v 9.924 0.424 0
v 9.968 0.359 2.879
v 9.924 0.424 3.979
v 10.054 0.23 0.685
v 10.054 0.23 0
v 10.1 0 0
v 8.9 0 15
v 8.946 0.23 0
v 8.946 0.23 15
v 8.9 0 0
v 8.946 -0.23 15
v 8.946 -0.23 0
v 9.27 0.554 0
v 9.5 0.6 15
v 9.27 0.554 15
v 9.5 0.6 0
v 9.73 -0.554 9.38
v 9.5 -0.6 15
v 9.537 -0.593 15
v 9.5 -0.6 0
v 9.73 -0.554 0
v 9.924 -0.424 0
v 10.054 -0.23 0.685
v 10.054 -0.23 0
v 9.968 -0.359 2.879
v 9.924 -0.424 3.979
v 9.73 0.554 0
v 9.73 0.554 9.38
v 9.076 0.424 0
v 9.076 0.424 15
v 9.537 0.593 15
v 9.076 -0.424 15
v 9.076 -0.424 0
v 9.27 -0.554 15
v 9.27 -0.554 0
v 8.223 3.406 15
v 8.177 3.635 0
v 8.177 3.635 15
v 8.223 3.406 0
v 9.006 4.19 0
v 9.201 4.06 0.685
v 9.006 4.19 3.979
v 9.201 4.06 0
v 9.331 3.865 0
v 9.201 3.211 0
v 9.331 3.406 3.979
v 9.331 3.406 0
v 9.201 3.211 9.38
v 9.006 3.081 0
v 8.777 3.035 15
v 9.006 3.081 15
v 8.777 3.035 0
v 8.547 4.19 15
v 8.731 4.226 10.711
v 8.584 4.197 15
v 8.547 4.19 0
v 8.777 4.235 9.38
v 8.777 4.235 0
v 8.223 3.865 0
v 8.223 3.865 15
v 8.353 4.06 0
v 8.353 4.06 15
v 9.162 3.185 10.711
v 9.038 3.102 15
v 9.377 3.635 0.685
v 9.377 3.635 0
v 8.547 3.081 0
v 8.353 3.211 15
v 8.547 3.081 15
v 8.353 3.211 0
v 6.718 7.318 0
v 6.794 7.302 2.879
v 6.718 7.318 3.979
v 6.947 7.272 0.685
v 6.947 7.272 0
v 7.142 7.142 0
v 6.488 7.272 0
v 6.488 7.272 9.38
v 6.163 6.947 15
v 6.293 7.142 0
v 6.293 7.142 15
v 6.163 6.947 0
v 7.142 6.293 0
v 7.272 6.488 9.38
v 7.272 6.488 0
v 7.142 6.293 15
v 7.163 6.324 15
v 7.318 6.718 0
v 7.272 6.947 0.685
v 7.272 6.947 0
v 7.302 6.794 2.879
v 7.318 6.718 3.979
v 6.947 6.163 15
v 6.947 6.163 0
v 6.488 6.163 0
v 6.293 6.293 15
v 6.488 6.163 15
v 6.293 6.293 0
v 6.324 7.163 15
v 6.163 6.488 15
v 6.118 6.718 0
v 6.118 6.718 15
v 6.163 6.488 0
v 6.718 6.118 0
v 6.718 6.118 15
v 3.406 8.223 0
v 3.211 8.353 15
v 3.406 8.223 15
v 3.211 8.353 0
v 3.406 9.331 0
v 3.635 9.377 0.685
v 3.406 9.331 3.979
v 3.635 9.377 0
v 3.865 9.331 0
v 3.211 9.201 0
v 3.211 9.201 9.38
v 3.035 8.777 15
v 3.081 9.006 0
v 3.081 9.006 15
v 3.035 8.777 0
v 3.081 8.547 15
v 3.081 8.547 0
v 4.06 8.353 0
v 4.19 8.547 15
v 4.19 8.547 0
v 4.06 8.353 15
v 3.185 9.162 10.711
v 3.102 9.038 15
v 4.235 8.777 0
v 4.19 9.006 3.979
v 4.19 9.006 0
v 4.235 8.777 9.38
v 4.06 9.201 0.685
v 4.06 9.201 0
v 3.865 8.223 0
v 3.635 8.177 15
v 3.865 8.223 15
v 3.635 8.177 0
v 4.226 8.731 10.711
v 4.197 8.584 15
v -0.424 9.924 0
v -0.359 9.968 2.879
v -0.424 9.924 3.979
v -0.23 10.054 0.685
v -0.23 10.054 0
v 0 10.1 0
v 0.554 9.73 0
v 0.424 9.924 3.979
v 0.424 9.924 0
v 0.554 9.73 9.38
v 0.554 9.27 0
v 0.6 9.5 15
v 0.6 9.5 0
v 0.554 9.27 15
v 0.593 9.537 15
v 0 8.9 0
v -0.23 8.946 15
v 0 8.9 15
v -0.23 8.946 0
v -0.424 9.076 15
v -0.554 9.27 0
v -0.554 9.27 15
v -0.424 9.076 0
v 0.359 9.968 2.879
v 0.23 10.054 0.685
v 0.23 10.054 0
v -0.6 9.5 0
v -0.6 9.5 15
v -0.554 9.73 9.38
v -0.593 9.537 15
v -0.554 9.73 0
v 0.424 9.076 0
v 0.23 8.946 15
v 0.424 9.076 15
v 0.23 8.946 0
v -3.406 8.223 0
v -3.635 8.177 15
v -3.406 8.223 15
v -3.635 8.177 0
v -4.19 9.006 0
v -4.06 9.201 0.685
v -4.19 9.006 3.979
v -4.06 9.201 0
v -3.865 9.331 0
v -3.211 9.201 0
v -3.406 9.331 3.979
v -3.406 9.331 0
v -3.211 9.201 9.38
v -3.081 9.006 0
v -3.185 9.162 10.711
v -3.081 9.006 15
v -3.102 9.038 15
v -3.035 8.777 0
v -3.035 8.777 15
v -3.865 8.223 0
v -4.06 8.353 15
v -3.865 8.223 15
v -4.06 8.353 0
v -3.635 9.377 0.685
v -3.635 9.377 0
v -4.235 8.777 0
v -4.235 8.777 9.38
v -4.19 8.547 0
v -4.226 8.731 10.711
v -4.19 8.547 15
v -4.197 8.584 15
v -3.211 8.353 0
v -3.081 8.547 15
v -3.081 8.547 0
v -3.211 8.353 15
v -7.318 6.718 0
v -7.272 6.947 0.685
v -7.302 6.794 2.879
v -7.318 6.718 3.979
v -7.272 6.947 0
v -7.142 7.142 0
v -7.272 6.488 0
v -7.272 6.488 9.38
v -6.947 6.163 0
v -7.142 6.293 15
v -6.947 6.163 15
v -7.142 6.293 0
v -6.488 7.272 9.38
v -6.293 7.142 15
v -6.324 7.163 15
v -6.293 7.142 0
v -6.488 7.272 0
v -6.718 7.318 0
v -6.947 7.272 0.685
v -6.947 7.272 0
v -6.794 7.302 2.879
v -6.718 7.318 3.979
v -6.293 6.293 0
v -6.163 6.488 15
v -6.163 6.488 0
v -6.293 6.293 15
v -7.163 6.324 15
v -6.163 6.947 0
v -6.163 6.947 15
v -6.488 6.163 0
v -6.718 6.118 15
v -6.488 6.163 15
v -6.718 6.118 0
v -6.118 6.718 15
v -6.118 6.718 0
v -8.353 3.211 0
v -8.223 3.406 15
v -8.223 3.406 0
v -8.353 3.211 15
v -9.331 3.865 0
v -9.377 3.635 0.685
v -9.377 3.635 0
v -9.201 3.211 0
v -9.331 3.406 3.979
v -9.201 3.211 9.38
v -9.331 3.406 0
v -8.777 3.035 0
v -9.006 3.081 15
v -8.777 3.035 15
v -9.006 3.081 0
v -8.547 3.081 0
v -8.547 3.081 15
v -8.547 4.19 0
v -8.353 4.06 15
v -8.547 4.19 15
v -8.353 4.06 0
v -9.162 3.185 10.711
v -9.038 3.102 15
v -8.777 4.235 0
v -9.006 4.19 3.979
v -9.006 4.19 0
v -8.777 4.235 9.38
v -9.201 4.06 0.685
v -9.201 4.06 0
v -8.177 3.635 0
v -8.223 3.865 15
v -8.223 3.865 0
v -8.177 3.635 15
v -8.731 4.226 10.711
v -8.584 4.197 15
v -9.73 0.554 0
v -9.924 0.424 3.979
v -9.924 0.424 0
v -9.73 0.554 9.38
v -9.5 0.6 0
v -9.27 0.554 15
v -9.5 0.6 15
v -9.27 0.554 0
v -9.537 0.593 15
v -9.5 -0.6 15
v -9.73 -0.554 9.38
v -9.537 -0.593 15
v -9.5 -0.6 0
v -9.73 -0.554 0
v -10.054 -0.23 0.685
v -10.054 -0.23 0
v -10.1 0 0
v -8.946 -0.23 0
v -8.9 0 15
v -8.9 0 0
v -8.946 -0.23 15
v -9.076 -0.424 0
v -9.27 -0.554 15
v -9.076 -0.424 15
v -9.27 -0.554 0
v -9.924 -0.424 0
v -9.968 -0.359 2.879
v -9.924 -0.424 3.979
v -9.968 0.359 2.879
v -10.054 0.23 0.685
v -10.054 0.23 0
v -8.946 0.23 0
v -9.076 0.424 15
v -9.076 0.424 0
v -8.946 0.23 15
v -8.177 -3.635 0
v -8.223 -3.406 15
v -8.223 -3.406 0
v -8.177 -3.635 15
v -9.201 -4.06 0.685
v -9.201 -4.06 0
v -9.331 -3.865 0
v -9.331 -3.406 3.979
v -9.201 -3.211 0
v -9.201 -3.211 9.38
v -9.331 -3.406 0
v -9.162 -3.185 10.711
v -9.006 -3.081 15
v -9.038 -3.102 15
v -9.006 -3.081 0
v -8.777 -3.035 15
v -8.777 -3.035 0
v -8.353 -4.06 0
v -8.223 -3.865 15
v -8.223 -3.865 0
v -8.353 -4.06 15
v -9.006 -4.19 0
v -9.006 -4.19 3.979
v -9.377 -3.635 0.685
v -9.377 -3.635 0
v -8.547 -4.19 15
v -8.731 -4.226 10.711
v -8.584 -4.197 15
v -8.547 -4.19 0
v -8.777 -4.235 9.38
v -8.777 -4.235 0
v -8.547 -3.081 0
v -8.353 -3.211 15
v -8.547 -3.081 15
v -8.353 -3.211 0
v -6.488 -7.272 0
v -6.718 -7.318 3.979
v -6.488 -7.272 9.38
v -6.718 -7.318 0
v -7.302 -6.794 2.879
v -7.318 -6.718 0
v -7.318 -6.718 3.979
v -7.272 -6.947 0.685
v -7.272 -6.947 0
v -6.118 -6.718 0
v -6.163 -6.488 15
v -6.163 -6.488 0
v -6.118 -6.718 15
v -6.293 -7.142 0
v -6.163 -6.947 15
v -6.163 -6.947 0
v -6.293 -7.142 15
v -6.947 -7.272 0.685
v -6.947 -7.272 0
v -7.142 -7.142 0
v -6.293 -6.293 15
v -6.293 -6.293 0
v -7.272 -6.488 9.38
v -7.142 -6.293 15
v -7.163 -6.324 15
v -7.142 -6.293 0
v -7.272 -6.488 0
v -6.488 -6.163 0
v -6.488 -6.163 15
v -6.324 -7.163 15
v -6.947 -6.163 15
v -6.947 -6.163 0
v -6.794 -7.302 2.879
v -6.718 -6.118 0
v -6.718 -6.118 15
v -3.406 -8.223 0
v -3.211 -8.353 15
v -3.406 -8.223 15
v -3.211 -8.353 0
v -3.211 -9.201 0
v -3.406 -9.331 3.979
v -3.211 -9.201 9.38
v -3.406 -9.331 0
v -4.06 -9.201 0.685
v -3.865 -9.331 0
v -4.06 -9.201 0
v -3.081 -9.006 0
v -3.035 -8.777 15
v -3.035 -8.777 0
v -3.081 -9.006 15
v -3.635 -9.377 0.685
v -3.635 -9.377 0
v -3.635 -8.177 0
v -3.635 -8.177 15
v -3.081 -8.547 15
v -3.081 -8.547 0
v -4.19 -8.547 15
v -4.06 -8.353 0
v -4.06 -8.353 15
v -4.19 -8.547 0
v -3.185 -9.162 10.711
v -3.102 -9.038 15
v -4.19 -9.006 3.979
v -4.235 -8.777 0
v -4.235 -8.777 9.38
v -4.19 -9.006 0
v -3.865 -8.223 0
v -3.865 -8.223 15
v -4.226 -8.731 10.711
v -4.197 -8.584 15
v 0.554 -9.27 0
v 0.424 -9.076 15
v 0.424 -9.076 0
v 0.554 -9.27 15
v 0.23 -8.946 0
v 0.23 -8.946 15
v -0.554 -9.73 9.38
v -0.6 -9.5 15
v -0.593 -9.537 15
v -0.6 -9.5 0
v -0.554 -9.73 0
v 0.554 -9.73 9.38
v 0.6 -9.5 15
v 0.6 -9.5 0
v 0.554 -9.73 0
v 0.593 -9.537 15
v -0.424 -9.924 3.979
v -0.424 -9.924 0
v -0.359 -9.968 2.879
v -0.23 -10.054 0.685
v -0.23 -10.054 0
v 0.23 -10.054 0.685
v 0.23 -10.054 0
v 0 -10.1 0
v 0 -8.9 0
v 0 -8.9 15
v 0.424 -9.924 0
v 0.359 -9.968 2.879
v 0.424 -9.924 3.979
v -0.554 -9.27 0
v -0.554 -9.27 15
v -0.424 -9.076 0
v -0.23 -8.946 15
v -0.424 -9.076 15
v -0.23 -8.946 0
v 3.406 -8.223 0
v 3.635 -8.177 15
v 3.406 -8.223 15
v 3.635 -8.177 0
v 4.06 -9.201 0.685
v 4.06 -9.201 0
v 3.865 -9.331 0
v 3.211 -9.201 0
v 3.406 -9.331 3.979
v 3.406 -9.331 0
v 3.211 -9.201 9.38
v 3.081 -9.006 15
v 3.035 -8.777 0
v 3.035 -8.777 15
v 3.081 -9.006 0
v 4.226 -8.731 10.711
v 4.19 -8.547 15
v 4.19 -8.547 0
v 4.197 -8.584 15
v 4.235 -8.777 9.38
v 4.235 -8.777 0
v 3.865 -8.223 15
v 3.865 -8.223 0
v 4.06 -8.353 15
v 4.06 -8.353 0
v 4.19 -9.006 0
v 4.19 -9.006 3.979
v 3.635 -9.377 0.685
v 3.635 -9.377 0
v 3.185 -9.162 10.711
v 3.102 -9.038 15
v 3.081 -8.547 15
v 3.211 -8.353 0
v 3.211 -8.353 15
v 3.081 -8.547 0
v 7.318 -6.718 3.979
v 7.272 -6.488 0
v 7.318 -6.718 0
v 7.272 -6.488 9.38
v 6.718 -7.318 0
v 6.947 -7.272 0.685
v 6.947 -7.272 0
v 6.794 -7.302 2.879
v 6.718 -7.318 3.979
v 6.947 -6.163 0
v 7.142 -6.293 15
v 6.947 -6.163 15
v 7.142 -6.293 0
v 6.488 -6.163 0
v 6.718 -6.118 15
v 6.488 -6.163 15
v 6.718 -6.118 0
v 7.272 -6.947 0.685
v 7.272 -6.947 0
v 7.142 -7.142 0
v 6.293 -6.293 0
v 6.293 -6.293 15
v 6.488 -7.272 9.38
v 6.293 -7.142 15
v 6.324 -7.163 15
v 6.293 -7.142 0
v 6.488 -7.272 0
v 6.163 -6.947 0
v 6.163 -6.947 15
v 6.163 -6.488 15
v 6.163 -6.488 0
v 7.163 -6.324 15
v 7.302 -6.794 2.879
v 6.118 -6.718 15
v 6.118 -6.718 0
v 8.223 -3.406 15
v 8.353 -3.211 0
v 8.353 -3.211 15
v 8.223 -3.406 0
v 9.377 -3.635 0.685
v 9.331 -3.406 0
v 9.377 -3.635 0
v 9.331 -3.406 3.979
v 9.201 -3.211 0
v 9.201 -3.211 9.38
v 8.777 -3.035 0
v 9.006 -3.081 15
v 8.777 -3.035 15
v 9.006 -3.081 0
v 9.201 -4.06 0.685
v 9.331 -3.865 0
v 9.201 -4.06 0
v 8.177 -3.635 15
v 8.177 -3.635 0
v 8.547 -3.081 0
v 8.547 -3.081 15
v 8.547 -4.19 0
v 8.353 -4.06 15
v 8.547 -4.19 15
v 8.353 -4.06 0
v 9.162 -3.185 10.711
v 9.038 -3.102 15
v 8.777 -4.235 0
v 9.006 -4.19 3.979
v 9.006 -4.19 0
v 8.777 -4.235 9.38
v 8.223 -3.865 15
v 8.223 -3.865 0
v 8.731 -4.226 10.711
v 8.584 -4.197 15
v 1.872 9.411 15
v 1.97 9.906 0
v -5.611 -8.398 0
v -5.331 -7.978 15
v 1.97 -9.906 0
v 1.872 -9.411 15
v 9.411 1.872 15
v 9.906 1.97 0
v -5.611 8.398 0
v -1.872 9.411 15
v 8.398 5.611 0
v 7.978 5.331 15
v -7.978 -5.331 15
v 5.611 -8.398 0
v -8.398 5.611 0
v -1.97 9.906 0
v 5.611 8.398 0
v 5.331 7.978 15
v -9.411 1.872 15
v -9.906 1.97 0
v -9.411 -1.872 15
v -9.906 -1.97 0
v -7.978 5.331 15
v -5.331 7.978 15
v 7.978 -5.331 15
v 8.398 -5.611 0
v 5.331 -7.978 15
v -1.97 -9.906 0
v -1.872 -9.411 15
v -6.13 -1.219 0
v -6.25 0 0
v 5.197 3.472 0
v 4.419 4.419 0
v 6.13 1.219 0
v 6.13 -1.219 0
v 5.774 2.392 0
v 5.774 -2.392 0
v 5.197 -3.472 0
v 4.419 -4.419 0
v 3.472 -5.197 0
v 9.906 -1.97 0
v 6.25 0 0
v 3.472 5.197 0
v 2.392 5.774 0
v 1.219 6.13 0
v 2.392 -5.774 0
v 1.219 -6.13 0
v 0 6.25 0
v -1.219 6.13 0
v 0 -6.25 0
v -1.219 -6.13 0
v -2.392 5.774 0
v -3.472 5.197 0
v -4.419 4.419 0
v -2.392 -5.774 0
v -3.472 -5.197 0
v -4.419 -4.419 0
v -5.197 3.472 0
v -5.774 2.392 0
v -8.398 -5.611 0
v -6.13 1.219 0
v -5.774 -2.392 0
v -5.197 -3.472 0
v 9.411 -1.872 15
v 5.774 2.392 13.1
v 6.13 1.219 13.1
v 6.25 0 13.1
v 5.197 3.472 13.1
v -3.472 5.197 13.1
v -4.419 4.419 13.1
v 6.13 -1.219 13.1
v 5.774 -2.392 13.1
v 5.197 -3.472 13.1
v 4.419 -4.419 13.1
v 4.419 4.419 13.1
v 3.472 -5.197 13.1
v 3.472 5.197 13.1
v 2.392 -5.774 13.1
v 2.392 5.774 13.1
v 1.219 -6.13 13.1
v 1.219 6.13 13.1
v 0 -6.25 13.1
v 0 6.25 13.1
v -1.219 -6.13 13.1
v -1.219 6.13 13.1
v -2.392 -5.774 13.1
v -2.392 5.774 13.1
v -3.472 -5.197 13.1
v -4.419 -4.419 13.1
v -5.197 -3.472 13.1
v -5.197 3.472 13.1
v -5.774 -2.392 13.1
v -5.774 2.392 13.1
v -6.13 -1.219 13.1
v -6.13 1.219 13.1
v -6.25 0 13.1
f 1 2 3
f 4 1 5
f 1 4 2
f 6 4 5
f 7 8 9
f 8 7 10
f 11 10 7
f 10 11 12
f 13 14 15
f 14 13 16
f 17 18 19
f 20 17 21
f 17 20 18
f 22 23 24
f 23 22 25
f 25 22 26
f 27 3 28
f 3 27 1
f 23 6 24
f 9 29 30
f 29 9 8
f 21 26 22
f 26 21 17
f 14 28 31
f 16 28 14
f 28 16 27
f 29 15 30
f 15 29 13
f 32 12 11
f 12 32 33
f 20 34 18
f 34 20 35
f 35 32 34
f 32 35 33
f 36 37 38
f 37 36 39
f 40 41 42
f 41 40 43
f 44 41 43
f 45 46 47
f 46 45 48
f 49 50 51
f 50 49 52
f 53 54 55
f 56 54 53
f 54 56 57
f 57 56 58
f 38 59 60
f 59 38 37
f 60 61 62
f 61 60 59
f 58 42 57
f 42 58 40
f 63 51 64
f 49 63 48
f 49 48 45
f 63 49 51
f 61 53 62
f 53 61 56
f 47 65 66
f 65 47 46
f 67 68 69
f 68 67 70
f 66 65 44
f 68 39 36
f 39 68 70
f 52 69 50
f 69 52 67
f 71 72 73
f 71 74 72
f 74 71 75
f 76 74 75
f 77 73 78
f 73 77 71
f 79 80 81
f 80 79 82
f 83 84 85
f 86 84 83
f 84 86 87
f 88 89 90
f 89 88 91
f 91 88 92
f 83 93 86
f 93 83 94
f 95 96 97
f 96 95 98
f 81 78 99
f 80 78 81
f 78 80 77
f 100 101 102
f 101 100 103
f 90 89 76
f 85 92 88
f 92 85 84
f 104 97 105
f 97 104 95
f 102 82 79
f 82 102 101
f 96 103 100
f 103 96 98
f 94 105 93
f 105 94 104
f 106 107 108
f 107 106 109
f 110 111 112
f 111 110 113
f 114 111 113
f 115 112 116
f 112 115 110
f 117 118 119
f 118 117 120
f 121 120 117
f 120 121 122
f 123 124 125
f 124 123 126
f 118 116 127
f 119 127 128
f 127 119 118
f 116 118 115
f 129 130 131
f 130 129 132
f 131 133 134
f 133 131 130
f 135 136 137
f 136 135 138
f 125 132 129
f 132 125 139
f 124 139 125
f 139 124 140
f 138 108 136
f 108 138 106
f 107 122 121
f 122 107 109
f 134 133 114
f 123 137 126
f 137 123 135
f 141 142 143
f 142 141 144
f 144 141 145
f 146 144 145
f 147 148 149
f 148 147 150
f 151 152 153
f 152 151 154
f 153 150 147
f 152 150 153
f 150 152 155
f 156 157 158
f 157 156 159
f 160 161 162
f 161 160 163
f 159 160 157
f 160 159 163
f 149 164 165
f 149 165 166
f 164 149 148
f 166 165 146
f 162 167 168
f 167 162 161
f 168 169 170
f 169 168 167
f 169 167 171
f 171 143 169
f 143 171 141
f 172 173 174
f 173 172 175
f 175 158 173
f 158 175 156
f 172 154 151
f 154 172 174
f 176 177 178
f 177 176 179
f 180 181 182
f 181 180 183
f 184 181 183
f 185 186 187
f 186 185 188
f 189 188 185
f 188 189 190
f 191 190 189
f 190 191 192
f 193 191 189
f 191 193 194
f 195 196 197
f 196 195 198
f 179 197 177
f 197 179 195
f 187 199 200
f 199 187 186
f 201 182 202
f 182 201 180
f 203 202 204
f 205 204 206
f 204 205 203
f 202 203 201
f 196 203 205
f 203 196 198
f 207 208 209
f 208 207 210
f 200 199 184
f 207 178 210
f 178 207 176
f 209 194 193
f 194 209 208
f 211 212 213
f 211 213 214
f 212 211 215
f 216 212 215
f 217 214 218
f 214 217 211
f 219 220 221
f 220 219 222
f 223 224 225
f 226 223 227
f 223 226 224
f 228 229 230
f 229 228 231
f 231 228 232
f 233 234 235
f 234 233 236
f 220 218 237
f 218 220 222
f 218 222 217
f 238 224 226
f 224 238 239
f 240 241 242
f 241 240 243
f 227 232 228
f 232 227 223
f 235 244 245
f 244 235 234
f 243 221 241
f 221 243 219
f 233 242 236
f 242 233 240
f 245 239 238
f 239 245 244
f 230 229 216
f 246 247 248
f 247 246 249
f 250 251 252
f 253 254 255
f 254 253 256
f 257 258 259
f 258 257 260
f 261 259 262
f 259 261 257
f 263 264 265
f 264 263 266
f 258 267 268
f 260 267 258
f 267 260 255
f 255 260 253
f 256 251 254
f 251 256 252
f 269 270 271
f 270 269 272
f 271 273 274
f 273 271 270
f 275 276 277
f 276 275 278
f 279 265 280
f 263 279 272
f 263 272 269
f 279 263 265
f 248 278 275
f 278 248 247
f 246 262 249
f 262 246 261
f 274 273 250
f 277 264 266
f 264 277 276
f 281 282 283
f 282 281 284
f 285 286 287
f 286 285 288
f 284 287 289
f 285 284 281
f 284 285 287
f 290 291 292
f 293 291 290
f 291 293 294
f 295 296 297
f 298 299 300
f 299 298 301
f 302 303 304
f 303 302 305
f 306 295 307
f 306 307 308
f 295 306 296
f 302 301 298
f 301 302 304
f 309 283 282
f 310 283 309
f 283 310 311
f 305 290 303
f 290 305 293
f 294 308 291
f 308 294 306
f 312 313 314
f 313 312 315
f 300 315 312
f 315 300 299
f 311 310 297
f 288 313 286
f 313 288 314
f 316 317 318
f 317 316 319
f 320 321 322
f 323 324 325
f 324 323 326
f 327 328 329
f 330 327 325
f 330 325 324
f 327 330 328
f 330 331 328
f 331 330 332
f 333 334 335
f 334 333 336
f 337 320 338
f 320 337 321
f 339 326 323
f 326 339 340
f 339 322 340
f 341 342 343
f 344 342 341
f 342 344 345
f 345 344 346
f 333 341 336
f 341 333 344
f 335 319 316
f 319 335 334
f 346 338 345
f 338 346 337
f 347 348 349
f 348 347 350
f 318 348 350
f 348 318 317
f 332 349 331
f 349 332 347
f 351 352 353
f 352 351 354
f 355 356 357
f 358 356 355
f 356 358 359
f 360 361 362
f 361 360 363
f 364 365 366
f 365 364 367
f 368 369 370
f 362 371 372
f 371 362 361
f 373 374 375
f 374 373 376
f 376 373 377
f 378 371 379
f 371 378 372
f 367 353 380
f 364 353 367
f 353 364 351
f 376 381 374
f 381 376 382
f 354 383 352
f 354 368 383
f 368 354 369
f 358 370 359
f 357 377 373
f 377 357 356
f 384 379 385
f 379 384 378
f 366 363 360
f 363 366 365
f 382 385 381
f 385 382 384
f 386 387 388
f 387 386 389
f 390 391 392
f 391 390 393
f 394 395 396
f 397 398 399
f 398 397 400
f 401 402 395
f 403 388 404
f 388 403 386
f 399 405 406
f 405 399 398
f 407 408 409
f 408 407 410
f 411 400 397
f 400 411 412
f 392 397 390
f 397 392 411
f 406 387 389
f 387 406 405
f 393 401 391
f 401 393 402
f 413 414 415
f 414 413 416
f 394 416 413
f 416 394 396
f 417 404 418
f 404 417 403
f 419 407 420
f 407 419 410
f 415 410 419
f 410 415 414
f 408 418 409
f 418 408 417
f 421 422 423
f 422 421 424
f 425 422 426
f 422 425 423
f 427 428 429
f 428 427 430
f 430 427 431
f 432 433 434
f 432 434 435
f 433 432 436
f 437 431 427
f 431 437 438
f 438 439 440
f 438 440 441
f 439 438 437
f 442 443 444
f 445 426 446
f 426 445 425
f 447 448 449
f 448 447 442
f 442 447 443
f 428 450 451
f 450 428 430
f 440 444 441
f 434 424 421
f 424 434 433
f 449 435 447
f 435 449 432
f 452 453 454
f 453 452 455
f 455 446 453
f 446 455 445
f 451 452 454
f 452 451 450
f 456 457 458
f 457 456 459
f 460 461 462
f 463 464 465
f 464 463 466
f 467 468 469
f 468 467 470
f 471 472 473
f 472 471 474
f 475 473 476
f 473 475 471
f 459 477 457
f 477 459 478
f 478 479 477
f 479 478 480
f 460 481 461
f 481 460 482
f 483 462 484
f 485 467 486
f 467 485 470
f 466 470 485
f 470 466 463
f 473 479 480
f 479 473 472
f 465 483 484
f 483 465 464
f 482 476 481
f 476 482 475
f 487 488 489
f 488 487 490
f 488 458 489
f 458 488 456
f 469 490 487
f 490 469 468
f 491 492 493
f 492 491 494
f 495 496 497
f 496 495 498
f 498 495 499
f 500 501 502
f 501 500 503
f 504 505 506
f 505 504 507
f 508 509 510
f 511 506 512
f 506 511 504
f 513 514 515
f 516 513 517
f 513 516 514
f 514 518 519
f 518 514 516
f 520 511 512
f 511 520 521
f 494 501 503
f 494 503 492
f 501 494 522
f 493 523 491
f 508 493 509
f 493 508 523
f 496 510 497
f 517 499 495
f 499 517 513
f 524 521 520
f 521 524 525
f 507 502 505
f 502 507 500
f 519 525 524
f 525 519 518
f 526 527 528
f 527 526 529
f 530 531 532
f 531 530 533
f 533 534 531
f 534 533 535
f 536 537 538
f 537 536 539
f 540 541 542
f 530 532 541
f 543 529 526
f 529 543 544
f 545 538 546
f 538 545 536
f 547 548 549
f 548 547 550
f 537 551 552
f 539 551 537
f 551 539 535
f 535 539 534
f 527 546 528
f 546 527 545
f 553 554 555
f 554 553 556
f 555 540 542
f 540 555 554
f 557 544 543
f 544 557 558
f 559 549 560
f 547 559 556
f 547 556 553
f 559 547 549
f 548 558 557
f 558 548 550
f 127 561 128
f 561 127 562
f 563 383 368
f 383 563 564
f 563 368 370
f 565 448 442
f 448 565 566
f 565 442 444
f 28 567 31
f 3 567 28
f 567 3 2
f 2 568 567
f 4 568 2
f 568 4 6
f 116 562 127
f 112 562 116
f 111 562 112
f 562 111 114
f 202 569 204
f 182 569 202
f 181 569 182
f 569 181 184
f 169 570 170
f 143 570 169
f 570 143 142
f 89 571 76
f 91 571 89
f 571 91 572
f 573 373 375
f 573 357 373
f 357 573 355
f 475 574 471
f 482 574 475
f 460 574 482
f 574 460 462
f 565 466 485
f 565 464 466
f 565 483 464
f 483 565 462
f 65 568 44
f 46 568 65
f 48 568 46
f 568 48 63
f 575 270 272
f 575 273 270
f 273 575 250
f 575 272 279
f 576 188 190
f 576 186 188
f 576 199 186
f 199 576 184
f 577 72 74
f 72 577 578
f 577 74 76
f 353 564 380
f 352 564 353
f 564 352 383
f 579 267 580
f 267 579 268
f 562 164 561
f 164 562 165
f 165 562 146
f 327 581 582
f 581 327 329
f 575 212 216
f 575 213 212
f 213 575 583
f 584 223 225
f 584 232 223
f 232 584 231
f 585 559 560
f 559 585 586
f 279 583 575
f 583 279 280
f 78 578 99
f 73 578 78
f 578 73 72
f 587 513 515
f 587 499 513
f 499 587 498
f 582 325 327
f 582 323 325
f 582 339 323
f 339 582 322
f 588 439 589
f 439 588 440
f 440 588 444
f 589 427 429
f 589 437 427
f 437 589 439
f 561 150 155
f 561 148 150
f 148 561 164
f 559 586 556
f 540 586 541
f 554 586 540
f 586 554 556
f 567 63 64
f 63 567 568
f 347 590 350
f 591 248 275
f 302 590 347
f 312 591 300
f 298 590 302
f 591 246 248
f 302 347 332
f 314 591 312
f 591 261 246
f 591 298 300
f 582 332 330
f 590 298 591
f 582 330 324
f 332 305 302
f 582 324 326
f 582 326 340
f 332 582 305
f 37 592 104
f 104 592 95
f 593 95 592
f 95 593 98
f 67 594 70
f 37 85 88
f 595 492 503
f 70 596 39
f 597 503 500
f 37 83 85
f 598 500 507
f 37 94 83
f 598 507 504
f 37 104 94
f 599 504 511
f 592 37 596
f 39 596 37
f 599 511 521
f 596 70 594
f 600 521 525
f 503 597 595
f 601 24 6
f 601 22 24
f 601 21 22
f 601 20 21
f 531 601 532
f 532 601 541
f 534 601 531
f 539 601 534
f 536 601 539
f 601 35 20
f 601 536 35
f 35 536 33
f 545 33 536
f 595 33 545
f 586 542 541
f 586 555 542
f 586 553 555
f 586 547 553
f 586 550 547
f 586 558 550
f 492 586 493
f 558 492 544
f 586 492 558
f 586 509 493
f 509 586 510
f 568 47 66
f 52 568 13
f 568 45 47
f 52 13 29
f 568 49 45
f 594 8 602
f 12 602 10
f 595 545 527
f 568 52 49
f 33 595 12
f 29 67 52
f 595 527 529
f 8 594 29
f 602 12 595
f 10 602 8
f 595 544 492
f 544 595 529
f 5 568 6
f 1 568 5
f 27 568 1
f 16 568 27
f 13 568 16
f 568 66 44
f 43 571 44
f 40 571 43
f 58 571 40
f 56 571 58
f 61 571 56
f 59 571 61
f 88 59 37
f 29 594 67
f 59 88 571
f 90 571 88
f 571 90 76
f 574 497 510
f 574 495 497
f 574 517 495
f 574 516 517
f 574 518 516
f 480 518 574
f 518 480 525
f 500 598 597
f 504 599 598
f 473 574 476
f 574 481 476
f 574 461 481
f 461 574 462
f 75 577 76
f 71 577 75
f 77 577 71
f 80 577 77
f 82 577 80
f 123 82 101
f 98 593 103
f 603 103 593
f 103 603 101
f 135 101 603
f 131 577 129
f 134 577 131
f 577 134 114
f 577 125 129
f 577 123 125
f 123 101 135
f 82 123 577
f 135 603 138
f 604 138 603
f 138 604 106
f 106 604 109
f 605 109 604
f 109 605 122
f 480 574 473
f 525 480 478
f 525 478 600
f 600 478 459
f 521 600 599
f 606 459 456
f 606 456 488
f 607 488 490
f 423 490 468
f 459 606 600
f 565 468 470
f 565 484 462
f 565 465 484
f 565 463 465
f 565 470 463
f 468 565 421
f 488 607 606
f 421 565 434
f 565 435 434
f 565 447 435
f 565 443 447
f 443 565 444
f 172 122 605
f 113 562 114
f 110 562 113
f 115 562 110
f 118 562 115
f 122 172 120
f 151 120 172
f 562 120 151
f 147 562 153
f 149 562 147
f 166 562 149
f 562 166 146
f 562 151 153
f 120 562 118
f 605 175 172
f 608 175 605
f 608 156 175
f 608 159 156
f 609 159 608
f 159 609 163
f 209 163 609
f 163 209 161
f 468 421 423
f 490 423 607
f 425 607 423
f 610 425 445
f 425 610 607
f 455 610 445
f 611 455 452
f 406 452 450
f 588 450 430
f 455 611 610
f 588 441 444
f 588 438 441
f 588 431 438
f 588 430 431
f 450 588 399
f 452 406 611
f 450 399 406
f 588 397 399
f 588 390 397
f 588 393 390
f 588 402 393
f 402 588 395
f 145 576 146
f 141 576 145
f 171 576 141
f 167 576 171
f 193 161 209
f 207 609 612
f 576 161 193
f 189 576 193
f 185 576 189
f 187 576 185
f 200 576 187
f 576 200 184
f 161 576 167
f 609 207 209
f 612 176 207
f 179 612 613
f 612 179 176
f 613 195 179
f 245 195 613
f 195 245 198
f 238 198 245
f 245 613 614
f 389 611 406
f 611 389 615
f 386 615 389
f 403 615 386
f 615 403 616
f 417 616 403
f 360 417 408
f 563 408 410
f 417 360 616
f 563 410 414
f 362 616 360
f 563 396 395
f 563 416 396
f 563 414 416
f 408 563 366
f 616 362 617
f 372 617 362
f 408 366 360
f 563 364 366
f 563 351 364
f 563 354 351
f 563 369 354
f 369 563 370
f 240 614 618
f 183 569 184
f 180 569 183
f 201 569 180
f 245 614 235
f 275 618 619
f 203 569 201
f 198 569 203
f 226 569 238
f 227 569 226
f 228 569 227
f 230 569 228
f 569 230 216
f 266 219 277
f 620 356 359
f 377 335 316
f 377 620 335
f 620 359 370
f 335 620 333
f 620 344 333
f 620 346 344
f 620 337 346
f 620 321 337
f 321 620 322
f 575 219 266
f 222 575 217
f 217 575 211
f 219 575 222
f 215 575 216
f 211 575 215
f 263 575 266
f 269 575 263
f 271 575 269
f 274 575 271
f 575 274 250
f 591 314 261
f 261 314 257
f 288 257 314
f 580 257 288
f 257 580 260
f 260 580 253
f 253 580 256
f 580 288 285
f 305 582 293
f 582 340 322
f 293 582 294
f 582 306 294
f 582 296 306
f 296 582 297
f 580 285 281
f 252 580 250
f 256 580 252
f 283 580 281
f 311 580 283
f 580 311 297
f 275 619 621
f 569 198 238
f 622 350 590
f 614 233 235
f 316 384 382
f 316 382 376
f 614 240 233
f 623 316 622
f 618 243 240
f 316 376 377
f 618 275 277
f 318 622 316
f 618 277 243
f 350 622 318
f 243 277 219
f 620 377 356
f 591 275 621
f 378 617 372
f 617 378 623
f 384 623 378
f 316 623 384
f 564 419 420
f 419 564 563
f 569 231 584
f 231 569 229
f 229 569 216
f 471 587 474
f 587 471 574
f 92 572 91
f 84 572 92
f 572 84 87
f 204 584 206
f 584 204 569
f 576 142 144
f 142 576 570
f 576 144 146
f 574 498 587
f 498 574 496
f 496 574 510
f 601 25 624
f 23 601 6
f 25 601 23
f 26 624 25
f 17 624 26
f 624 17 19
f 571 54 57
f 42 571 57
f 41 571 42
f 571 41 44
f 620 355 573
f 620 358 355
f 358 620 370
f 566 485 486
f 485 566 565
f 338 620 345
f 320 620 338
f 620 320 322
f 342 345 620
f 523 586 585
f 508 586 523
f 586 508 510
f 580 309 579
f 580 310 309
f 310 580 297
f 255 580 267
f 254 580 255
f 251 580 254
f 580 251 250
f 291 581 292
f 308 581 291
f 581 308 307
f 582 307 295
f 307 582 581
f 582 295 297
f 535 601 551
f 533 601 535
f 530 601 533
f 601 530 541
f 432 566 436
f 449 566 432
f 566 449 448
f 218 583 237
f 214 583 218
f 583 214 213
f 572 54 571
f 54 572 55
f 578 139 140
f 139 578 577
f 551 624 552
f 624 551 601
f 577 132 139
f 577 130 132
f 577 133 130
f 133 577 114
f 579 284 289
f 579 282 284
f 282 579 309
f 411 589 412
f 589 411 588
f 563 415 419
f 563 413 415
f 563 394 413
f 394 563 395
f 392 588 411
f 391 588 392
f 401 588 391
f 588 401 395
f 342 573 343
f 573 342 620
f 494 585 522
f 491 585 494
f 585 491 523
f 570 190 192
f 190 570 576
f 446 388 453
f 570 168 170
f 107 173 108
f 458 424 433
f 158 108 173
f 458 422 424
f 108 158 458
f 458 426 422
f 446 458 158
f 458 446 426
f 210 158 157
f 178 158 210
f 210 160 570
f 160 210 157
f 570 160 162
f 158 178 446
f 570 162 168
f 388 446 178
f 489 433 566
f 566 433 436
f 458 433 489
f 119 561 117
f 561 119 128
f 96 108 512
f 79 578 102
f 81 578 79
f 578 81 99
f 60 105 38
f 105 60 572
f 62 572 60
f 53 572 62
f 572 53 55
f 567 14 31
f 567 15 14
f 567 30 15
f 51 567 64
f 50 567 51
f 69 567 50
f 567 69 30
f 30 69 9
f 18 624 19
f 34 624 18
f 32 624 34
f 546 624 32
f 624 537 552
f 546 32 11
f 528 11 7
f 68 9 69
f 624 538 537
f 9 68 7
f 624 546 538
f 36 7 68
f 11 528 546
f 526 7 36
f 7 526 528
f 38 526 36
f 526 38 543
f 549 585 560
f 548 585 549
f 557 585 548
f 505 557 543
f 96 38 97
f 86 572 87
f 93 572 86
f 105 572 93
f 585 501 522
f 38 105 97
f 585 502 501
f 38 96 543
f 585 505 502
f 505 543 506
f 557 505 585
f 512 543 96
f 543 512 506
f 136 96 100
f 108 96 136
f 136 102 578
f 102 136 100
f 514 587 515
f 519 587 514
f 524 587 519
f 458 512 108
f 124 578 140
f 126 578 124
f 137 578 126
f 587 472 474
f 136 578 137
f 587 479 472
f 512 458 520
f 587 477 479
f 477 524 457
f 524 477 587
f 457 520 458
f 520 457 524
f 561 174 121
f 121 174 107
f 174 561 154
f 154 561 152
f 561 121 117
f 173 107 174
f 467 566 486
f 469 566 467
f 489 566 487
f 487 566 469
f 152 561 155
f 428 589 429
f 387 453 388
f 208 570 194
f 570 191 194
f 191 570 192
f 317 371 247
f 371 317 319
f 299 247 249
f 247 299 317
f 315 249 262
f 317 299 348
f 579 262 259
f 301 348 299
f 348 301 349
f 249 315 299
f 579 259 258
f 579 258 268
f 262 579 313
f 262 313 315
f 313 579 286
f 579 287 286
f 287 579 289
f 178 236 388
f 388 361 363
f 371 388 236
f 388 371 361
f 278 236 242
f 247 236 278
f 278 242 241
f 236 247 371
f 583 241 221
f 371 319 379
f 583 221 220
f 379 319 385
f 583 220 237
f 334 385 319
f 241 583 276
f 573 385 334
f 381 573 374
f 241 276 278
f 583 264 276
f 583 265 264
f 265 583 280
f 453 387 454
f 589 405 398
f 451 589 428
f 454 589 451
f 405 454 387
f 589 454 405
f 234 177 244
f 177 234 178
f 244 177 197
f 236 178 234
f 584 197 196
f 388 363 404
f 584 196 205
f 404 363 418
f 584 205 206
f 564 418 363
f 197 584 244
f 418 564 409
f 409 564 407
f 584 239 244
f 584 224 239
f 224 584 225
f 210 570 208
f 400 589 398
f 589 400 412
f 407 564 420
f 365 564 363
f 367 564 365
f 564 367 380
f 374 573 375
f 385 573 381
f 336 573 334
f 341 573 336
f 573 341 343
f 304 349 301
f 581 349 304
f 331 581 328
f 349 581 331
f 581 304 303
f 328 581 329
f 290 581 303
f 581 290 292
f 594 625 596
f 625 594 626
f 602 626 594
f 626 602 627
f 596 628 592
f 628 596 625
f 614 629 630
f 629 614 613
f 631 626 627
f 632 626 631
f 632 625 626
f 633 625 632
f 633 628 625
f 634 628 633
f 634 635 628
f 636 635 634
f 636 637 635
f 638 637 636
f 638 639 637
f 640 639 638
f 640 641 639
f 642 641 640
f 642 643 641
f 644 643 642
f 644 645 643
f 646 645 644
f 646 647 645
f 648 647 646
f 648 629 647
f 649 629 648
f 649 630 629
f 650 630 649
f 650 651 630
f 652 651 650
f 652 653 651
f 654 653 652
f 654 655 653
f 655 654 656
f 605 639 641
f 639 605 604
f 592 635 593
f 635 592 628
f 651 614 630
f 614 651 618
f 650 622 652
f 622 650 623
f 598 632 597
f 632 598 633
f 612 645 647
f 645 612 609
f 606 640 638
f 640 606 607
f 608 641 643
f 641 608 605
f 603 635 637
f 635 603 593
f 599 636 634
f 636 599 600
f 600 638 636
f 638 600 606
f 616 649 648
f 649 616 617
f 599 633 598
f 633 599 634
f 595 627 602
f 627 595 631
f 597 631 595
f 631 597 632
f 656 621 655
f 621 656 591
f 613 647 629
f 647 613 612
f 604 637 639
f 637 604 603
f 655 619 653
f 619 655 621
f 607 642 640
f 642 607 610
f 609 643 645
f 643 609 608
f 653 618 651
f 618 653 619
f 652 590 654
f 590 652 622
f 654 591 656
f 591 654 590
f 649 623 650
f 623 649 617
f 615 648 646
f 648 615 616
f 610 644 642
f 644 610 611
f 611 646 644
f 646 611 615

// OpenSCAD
// ACCESS KNOB — Elektron Machinedrum Tempo Knob (Slip-On Sleeve)
// Generated via CLI for Studio Knobs (Slip-On Sleeve)
module access_knob_elektron_tempo_slipon() {
  outer_d = 20.2;
  height = 15;
  taper = 0.95;
  bore_d = 12.2;
  slot_h = 13;
  tex_depth = 1.2;
  tex_scale = 1.2;
  tex_count = 16;

  difference() {
    cylinder(h=height, d1=outer_d, d2=outer_d*taper, $fn=32);
    translate([0,0,-0.1]) cylinder(h=slot_h+0.2, d=bore_d + 0.3, $fn=32);
    for(i=[0:tex_count-1]) {
      rotate([0,0,i*(360/tex_count)])
        translate([outer_d/2-tex_depth/2, 0, height/2])
          cylinder(h=height*1.1, d=tex_scale, center=true, $fn=16);
    }
  }
}
access_knob_elektron_tempo_slipon();
